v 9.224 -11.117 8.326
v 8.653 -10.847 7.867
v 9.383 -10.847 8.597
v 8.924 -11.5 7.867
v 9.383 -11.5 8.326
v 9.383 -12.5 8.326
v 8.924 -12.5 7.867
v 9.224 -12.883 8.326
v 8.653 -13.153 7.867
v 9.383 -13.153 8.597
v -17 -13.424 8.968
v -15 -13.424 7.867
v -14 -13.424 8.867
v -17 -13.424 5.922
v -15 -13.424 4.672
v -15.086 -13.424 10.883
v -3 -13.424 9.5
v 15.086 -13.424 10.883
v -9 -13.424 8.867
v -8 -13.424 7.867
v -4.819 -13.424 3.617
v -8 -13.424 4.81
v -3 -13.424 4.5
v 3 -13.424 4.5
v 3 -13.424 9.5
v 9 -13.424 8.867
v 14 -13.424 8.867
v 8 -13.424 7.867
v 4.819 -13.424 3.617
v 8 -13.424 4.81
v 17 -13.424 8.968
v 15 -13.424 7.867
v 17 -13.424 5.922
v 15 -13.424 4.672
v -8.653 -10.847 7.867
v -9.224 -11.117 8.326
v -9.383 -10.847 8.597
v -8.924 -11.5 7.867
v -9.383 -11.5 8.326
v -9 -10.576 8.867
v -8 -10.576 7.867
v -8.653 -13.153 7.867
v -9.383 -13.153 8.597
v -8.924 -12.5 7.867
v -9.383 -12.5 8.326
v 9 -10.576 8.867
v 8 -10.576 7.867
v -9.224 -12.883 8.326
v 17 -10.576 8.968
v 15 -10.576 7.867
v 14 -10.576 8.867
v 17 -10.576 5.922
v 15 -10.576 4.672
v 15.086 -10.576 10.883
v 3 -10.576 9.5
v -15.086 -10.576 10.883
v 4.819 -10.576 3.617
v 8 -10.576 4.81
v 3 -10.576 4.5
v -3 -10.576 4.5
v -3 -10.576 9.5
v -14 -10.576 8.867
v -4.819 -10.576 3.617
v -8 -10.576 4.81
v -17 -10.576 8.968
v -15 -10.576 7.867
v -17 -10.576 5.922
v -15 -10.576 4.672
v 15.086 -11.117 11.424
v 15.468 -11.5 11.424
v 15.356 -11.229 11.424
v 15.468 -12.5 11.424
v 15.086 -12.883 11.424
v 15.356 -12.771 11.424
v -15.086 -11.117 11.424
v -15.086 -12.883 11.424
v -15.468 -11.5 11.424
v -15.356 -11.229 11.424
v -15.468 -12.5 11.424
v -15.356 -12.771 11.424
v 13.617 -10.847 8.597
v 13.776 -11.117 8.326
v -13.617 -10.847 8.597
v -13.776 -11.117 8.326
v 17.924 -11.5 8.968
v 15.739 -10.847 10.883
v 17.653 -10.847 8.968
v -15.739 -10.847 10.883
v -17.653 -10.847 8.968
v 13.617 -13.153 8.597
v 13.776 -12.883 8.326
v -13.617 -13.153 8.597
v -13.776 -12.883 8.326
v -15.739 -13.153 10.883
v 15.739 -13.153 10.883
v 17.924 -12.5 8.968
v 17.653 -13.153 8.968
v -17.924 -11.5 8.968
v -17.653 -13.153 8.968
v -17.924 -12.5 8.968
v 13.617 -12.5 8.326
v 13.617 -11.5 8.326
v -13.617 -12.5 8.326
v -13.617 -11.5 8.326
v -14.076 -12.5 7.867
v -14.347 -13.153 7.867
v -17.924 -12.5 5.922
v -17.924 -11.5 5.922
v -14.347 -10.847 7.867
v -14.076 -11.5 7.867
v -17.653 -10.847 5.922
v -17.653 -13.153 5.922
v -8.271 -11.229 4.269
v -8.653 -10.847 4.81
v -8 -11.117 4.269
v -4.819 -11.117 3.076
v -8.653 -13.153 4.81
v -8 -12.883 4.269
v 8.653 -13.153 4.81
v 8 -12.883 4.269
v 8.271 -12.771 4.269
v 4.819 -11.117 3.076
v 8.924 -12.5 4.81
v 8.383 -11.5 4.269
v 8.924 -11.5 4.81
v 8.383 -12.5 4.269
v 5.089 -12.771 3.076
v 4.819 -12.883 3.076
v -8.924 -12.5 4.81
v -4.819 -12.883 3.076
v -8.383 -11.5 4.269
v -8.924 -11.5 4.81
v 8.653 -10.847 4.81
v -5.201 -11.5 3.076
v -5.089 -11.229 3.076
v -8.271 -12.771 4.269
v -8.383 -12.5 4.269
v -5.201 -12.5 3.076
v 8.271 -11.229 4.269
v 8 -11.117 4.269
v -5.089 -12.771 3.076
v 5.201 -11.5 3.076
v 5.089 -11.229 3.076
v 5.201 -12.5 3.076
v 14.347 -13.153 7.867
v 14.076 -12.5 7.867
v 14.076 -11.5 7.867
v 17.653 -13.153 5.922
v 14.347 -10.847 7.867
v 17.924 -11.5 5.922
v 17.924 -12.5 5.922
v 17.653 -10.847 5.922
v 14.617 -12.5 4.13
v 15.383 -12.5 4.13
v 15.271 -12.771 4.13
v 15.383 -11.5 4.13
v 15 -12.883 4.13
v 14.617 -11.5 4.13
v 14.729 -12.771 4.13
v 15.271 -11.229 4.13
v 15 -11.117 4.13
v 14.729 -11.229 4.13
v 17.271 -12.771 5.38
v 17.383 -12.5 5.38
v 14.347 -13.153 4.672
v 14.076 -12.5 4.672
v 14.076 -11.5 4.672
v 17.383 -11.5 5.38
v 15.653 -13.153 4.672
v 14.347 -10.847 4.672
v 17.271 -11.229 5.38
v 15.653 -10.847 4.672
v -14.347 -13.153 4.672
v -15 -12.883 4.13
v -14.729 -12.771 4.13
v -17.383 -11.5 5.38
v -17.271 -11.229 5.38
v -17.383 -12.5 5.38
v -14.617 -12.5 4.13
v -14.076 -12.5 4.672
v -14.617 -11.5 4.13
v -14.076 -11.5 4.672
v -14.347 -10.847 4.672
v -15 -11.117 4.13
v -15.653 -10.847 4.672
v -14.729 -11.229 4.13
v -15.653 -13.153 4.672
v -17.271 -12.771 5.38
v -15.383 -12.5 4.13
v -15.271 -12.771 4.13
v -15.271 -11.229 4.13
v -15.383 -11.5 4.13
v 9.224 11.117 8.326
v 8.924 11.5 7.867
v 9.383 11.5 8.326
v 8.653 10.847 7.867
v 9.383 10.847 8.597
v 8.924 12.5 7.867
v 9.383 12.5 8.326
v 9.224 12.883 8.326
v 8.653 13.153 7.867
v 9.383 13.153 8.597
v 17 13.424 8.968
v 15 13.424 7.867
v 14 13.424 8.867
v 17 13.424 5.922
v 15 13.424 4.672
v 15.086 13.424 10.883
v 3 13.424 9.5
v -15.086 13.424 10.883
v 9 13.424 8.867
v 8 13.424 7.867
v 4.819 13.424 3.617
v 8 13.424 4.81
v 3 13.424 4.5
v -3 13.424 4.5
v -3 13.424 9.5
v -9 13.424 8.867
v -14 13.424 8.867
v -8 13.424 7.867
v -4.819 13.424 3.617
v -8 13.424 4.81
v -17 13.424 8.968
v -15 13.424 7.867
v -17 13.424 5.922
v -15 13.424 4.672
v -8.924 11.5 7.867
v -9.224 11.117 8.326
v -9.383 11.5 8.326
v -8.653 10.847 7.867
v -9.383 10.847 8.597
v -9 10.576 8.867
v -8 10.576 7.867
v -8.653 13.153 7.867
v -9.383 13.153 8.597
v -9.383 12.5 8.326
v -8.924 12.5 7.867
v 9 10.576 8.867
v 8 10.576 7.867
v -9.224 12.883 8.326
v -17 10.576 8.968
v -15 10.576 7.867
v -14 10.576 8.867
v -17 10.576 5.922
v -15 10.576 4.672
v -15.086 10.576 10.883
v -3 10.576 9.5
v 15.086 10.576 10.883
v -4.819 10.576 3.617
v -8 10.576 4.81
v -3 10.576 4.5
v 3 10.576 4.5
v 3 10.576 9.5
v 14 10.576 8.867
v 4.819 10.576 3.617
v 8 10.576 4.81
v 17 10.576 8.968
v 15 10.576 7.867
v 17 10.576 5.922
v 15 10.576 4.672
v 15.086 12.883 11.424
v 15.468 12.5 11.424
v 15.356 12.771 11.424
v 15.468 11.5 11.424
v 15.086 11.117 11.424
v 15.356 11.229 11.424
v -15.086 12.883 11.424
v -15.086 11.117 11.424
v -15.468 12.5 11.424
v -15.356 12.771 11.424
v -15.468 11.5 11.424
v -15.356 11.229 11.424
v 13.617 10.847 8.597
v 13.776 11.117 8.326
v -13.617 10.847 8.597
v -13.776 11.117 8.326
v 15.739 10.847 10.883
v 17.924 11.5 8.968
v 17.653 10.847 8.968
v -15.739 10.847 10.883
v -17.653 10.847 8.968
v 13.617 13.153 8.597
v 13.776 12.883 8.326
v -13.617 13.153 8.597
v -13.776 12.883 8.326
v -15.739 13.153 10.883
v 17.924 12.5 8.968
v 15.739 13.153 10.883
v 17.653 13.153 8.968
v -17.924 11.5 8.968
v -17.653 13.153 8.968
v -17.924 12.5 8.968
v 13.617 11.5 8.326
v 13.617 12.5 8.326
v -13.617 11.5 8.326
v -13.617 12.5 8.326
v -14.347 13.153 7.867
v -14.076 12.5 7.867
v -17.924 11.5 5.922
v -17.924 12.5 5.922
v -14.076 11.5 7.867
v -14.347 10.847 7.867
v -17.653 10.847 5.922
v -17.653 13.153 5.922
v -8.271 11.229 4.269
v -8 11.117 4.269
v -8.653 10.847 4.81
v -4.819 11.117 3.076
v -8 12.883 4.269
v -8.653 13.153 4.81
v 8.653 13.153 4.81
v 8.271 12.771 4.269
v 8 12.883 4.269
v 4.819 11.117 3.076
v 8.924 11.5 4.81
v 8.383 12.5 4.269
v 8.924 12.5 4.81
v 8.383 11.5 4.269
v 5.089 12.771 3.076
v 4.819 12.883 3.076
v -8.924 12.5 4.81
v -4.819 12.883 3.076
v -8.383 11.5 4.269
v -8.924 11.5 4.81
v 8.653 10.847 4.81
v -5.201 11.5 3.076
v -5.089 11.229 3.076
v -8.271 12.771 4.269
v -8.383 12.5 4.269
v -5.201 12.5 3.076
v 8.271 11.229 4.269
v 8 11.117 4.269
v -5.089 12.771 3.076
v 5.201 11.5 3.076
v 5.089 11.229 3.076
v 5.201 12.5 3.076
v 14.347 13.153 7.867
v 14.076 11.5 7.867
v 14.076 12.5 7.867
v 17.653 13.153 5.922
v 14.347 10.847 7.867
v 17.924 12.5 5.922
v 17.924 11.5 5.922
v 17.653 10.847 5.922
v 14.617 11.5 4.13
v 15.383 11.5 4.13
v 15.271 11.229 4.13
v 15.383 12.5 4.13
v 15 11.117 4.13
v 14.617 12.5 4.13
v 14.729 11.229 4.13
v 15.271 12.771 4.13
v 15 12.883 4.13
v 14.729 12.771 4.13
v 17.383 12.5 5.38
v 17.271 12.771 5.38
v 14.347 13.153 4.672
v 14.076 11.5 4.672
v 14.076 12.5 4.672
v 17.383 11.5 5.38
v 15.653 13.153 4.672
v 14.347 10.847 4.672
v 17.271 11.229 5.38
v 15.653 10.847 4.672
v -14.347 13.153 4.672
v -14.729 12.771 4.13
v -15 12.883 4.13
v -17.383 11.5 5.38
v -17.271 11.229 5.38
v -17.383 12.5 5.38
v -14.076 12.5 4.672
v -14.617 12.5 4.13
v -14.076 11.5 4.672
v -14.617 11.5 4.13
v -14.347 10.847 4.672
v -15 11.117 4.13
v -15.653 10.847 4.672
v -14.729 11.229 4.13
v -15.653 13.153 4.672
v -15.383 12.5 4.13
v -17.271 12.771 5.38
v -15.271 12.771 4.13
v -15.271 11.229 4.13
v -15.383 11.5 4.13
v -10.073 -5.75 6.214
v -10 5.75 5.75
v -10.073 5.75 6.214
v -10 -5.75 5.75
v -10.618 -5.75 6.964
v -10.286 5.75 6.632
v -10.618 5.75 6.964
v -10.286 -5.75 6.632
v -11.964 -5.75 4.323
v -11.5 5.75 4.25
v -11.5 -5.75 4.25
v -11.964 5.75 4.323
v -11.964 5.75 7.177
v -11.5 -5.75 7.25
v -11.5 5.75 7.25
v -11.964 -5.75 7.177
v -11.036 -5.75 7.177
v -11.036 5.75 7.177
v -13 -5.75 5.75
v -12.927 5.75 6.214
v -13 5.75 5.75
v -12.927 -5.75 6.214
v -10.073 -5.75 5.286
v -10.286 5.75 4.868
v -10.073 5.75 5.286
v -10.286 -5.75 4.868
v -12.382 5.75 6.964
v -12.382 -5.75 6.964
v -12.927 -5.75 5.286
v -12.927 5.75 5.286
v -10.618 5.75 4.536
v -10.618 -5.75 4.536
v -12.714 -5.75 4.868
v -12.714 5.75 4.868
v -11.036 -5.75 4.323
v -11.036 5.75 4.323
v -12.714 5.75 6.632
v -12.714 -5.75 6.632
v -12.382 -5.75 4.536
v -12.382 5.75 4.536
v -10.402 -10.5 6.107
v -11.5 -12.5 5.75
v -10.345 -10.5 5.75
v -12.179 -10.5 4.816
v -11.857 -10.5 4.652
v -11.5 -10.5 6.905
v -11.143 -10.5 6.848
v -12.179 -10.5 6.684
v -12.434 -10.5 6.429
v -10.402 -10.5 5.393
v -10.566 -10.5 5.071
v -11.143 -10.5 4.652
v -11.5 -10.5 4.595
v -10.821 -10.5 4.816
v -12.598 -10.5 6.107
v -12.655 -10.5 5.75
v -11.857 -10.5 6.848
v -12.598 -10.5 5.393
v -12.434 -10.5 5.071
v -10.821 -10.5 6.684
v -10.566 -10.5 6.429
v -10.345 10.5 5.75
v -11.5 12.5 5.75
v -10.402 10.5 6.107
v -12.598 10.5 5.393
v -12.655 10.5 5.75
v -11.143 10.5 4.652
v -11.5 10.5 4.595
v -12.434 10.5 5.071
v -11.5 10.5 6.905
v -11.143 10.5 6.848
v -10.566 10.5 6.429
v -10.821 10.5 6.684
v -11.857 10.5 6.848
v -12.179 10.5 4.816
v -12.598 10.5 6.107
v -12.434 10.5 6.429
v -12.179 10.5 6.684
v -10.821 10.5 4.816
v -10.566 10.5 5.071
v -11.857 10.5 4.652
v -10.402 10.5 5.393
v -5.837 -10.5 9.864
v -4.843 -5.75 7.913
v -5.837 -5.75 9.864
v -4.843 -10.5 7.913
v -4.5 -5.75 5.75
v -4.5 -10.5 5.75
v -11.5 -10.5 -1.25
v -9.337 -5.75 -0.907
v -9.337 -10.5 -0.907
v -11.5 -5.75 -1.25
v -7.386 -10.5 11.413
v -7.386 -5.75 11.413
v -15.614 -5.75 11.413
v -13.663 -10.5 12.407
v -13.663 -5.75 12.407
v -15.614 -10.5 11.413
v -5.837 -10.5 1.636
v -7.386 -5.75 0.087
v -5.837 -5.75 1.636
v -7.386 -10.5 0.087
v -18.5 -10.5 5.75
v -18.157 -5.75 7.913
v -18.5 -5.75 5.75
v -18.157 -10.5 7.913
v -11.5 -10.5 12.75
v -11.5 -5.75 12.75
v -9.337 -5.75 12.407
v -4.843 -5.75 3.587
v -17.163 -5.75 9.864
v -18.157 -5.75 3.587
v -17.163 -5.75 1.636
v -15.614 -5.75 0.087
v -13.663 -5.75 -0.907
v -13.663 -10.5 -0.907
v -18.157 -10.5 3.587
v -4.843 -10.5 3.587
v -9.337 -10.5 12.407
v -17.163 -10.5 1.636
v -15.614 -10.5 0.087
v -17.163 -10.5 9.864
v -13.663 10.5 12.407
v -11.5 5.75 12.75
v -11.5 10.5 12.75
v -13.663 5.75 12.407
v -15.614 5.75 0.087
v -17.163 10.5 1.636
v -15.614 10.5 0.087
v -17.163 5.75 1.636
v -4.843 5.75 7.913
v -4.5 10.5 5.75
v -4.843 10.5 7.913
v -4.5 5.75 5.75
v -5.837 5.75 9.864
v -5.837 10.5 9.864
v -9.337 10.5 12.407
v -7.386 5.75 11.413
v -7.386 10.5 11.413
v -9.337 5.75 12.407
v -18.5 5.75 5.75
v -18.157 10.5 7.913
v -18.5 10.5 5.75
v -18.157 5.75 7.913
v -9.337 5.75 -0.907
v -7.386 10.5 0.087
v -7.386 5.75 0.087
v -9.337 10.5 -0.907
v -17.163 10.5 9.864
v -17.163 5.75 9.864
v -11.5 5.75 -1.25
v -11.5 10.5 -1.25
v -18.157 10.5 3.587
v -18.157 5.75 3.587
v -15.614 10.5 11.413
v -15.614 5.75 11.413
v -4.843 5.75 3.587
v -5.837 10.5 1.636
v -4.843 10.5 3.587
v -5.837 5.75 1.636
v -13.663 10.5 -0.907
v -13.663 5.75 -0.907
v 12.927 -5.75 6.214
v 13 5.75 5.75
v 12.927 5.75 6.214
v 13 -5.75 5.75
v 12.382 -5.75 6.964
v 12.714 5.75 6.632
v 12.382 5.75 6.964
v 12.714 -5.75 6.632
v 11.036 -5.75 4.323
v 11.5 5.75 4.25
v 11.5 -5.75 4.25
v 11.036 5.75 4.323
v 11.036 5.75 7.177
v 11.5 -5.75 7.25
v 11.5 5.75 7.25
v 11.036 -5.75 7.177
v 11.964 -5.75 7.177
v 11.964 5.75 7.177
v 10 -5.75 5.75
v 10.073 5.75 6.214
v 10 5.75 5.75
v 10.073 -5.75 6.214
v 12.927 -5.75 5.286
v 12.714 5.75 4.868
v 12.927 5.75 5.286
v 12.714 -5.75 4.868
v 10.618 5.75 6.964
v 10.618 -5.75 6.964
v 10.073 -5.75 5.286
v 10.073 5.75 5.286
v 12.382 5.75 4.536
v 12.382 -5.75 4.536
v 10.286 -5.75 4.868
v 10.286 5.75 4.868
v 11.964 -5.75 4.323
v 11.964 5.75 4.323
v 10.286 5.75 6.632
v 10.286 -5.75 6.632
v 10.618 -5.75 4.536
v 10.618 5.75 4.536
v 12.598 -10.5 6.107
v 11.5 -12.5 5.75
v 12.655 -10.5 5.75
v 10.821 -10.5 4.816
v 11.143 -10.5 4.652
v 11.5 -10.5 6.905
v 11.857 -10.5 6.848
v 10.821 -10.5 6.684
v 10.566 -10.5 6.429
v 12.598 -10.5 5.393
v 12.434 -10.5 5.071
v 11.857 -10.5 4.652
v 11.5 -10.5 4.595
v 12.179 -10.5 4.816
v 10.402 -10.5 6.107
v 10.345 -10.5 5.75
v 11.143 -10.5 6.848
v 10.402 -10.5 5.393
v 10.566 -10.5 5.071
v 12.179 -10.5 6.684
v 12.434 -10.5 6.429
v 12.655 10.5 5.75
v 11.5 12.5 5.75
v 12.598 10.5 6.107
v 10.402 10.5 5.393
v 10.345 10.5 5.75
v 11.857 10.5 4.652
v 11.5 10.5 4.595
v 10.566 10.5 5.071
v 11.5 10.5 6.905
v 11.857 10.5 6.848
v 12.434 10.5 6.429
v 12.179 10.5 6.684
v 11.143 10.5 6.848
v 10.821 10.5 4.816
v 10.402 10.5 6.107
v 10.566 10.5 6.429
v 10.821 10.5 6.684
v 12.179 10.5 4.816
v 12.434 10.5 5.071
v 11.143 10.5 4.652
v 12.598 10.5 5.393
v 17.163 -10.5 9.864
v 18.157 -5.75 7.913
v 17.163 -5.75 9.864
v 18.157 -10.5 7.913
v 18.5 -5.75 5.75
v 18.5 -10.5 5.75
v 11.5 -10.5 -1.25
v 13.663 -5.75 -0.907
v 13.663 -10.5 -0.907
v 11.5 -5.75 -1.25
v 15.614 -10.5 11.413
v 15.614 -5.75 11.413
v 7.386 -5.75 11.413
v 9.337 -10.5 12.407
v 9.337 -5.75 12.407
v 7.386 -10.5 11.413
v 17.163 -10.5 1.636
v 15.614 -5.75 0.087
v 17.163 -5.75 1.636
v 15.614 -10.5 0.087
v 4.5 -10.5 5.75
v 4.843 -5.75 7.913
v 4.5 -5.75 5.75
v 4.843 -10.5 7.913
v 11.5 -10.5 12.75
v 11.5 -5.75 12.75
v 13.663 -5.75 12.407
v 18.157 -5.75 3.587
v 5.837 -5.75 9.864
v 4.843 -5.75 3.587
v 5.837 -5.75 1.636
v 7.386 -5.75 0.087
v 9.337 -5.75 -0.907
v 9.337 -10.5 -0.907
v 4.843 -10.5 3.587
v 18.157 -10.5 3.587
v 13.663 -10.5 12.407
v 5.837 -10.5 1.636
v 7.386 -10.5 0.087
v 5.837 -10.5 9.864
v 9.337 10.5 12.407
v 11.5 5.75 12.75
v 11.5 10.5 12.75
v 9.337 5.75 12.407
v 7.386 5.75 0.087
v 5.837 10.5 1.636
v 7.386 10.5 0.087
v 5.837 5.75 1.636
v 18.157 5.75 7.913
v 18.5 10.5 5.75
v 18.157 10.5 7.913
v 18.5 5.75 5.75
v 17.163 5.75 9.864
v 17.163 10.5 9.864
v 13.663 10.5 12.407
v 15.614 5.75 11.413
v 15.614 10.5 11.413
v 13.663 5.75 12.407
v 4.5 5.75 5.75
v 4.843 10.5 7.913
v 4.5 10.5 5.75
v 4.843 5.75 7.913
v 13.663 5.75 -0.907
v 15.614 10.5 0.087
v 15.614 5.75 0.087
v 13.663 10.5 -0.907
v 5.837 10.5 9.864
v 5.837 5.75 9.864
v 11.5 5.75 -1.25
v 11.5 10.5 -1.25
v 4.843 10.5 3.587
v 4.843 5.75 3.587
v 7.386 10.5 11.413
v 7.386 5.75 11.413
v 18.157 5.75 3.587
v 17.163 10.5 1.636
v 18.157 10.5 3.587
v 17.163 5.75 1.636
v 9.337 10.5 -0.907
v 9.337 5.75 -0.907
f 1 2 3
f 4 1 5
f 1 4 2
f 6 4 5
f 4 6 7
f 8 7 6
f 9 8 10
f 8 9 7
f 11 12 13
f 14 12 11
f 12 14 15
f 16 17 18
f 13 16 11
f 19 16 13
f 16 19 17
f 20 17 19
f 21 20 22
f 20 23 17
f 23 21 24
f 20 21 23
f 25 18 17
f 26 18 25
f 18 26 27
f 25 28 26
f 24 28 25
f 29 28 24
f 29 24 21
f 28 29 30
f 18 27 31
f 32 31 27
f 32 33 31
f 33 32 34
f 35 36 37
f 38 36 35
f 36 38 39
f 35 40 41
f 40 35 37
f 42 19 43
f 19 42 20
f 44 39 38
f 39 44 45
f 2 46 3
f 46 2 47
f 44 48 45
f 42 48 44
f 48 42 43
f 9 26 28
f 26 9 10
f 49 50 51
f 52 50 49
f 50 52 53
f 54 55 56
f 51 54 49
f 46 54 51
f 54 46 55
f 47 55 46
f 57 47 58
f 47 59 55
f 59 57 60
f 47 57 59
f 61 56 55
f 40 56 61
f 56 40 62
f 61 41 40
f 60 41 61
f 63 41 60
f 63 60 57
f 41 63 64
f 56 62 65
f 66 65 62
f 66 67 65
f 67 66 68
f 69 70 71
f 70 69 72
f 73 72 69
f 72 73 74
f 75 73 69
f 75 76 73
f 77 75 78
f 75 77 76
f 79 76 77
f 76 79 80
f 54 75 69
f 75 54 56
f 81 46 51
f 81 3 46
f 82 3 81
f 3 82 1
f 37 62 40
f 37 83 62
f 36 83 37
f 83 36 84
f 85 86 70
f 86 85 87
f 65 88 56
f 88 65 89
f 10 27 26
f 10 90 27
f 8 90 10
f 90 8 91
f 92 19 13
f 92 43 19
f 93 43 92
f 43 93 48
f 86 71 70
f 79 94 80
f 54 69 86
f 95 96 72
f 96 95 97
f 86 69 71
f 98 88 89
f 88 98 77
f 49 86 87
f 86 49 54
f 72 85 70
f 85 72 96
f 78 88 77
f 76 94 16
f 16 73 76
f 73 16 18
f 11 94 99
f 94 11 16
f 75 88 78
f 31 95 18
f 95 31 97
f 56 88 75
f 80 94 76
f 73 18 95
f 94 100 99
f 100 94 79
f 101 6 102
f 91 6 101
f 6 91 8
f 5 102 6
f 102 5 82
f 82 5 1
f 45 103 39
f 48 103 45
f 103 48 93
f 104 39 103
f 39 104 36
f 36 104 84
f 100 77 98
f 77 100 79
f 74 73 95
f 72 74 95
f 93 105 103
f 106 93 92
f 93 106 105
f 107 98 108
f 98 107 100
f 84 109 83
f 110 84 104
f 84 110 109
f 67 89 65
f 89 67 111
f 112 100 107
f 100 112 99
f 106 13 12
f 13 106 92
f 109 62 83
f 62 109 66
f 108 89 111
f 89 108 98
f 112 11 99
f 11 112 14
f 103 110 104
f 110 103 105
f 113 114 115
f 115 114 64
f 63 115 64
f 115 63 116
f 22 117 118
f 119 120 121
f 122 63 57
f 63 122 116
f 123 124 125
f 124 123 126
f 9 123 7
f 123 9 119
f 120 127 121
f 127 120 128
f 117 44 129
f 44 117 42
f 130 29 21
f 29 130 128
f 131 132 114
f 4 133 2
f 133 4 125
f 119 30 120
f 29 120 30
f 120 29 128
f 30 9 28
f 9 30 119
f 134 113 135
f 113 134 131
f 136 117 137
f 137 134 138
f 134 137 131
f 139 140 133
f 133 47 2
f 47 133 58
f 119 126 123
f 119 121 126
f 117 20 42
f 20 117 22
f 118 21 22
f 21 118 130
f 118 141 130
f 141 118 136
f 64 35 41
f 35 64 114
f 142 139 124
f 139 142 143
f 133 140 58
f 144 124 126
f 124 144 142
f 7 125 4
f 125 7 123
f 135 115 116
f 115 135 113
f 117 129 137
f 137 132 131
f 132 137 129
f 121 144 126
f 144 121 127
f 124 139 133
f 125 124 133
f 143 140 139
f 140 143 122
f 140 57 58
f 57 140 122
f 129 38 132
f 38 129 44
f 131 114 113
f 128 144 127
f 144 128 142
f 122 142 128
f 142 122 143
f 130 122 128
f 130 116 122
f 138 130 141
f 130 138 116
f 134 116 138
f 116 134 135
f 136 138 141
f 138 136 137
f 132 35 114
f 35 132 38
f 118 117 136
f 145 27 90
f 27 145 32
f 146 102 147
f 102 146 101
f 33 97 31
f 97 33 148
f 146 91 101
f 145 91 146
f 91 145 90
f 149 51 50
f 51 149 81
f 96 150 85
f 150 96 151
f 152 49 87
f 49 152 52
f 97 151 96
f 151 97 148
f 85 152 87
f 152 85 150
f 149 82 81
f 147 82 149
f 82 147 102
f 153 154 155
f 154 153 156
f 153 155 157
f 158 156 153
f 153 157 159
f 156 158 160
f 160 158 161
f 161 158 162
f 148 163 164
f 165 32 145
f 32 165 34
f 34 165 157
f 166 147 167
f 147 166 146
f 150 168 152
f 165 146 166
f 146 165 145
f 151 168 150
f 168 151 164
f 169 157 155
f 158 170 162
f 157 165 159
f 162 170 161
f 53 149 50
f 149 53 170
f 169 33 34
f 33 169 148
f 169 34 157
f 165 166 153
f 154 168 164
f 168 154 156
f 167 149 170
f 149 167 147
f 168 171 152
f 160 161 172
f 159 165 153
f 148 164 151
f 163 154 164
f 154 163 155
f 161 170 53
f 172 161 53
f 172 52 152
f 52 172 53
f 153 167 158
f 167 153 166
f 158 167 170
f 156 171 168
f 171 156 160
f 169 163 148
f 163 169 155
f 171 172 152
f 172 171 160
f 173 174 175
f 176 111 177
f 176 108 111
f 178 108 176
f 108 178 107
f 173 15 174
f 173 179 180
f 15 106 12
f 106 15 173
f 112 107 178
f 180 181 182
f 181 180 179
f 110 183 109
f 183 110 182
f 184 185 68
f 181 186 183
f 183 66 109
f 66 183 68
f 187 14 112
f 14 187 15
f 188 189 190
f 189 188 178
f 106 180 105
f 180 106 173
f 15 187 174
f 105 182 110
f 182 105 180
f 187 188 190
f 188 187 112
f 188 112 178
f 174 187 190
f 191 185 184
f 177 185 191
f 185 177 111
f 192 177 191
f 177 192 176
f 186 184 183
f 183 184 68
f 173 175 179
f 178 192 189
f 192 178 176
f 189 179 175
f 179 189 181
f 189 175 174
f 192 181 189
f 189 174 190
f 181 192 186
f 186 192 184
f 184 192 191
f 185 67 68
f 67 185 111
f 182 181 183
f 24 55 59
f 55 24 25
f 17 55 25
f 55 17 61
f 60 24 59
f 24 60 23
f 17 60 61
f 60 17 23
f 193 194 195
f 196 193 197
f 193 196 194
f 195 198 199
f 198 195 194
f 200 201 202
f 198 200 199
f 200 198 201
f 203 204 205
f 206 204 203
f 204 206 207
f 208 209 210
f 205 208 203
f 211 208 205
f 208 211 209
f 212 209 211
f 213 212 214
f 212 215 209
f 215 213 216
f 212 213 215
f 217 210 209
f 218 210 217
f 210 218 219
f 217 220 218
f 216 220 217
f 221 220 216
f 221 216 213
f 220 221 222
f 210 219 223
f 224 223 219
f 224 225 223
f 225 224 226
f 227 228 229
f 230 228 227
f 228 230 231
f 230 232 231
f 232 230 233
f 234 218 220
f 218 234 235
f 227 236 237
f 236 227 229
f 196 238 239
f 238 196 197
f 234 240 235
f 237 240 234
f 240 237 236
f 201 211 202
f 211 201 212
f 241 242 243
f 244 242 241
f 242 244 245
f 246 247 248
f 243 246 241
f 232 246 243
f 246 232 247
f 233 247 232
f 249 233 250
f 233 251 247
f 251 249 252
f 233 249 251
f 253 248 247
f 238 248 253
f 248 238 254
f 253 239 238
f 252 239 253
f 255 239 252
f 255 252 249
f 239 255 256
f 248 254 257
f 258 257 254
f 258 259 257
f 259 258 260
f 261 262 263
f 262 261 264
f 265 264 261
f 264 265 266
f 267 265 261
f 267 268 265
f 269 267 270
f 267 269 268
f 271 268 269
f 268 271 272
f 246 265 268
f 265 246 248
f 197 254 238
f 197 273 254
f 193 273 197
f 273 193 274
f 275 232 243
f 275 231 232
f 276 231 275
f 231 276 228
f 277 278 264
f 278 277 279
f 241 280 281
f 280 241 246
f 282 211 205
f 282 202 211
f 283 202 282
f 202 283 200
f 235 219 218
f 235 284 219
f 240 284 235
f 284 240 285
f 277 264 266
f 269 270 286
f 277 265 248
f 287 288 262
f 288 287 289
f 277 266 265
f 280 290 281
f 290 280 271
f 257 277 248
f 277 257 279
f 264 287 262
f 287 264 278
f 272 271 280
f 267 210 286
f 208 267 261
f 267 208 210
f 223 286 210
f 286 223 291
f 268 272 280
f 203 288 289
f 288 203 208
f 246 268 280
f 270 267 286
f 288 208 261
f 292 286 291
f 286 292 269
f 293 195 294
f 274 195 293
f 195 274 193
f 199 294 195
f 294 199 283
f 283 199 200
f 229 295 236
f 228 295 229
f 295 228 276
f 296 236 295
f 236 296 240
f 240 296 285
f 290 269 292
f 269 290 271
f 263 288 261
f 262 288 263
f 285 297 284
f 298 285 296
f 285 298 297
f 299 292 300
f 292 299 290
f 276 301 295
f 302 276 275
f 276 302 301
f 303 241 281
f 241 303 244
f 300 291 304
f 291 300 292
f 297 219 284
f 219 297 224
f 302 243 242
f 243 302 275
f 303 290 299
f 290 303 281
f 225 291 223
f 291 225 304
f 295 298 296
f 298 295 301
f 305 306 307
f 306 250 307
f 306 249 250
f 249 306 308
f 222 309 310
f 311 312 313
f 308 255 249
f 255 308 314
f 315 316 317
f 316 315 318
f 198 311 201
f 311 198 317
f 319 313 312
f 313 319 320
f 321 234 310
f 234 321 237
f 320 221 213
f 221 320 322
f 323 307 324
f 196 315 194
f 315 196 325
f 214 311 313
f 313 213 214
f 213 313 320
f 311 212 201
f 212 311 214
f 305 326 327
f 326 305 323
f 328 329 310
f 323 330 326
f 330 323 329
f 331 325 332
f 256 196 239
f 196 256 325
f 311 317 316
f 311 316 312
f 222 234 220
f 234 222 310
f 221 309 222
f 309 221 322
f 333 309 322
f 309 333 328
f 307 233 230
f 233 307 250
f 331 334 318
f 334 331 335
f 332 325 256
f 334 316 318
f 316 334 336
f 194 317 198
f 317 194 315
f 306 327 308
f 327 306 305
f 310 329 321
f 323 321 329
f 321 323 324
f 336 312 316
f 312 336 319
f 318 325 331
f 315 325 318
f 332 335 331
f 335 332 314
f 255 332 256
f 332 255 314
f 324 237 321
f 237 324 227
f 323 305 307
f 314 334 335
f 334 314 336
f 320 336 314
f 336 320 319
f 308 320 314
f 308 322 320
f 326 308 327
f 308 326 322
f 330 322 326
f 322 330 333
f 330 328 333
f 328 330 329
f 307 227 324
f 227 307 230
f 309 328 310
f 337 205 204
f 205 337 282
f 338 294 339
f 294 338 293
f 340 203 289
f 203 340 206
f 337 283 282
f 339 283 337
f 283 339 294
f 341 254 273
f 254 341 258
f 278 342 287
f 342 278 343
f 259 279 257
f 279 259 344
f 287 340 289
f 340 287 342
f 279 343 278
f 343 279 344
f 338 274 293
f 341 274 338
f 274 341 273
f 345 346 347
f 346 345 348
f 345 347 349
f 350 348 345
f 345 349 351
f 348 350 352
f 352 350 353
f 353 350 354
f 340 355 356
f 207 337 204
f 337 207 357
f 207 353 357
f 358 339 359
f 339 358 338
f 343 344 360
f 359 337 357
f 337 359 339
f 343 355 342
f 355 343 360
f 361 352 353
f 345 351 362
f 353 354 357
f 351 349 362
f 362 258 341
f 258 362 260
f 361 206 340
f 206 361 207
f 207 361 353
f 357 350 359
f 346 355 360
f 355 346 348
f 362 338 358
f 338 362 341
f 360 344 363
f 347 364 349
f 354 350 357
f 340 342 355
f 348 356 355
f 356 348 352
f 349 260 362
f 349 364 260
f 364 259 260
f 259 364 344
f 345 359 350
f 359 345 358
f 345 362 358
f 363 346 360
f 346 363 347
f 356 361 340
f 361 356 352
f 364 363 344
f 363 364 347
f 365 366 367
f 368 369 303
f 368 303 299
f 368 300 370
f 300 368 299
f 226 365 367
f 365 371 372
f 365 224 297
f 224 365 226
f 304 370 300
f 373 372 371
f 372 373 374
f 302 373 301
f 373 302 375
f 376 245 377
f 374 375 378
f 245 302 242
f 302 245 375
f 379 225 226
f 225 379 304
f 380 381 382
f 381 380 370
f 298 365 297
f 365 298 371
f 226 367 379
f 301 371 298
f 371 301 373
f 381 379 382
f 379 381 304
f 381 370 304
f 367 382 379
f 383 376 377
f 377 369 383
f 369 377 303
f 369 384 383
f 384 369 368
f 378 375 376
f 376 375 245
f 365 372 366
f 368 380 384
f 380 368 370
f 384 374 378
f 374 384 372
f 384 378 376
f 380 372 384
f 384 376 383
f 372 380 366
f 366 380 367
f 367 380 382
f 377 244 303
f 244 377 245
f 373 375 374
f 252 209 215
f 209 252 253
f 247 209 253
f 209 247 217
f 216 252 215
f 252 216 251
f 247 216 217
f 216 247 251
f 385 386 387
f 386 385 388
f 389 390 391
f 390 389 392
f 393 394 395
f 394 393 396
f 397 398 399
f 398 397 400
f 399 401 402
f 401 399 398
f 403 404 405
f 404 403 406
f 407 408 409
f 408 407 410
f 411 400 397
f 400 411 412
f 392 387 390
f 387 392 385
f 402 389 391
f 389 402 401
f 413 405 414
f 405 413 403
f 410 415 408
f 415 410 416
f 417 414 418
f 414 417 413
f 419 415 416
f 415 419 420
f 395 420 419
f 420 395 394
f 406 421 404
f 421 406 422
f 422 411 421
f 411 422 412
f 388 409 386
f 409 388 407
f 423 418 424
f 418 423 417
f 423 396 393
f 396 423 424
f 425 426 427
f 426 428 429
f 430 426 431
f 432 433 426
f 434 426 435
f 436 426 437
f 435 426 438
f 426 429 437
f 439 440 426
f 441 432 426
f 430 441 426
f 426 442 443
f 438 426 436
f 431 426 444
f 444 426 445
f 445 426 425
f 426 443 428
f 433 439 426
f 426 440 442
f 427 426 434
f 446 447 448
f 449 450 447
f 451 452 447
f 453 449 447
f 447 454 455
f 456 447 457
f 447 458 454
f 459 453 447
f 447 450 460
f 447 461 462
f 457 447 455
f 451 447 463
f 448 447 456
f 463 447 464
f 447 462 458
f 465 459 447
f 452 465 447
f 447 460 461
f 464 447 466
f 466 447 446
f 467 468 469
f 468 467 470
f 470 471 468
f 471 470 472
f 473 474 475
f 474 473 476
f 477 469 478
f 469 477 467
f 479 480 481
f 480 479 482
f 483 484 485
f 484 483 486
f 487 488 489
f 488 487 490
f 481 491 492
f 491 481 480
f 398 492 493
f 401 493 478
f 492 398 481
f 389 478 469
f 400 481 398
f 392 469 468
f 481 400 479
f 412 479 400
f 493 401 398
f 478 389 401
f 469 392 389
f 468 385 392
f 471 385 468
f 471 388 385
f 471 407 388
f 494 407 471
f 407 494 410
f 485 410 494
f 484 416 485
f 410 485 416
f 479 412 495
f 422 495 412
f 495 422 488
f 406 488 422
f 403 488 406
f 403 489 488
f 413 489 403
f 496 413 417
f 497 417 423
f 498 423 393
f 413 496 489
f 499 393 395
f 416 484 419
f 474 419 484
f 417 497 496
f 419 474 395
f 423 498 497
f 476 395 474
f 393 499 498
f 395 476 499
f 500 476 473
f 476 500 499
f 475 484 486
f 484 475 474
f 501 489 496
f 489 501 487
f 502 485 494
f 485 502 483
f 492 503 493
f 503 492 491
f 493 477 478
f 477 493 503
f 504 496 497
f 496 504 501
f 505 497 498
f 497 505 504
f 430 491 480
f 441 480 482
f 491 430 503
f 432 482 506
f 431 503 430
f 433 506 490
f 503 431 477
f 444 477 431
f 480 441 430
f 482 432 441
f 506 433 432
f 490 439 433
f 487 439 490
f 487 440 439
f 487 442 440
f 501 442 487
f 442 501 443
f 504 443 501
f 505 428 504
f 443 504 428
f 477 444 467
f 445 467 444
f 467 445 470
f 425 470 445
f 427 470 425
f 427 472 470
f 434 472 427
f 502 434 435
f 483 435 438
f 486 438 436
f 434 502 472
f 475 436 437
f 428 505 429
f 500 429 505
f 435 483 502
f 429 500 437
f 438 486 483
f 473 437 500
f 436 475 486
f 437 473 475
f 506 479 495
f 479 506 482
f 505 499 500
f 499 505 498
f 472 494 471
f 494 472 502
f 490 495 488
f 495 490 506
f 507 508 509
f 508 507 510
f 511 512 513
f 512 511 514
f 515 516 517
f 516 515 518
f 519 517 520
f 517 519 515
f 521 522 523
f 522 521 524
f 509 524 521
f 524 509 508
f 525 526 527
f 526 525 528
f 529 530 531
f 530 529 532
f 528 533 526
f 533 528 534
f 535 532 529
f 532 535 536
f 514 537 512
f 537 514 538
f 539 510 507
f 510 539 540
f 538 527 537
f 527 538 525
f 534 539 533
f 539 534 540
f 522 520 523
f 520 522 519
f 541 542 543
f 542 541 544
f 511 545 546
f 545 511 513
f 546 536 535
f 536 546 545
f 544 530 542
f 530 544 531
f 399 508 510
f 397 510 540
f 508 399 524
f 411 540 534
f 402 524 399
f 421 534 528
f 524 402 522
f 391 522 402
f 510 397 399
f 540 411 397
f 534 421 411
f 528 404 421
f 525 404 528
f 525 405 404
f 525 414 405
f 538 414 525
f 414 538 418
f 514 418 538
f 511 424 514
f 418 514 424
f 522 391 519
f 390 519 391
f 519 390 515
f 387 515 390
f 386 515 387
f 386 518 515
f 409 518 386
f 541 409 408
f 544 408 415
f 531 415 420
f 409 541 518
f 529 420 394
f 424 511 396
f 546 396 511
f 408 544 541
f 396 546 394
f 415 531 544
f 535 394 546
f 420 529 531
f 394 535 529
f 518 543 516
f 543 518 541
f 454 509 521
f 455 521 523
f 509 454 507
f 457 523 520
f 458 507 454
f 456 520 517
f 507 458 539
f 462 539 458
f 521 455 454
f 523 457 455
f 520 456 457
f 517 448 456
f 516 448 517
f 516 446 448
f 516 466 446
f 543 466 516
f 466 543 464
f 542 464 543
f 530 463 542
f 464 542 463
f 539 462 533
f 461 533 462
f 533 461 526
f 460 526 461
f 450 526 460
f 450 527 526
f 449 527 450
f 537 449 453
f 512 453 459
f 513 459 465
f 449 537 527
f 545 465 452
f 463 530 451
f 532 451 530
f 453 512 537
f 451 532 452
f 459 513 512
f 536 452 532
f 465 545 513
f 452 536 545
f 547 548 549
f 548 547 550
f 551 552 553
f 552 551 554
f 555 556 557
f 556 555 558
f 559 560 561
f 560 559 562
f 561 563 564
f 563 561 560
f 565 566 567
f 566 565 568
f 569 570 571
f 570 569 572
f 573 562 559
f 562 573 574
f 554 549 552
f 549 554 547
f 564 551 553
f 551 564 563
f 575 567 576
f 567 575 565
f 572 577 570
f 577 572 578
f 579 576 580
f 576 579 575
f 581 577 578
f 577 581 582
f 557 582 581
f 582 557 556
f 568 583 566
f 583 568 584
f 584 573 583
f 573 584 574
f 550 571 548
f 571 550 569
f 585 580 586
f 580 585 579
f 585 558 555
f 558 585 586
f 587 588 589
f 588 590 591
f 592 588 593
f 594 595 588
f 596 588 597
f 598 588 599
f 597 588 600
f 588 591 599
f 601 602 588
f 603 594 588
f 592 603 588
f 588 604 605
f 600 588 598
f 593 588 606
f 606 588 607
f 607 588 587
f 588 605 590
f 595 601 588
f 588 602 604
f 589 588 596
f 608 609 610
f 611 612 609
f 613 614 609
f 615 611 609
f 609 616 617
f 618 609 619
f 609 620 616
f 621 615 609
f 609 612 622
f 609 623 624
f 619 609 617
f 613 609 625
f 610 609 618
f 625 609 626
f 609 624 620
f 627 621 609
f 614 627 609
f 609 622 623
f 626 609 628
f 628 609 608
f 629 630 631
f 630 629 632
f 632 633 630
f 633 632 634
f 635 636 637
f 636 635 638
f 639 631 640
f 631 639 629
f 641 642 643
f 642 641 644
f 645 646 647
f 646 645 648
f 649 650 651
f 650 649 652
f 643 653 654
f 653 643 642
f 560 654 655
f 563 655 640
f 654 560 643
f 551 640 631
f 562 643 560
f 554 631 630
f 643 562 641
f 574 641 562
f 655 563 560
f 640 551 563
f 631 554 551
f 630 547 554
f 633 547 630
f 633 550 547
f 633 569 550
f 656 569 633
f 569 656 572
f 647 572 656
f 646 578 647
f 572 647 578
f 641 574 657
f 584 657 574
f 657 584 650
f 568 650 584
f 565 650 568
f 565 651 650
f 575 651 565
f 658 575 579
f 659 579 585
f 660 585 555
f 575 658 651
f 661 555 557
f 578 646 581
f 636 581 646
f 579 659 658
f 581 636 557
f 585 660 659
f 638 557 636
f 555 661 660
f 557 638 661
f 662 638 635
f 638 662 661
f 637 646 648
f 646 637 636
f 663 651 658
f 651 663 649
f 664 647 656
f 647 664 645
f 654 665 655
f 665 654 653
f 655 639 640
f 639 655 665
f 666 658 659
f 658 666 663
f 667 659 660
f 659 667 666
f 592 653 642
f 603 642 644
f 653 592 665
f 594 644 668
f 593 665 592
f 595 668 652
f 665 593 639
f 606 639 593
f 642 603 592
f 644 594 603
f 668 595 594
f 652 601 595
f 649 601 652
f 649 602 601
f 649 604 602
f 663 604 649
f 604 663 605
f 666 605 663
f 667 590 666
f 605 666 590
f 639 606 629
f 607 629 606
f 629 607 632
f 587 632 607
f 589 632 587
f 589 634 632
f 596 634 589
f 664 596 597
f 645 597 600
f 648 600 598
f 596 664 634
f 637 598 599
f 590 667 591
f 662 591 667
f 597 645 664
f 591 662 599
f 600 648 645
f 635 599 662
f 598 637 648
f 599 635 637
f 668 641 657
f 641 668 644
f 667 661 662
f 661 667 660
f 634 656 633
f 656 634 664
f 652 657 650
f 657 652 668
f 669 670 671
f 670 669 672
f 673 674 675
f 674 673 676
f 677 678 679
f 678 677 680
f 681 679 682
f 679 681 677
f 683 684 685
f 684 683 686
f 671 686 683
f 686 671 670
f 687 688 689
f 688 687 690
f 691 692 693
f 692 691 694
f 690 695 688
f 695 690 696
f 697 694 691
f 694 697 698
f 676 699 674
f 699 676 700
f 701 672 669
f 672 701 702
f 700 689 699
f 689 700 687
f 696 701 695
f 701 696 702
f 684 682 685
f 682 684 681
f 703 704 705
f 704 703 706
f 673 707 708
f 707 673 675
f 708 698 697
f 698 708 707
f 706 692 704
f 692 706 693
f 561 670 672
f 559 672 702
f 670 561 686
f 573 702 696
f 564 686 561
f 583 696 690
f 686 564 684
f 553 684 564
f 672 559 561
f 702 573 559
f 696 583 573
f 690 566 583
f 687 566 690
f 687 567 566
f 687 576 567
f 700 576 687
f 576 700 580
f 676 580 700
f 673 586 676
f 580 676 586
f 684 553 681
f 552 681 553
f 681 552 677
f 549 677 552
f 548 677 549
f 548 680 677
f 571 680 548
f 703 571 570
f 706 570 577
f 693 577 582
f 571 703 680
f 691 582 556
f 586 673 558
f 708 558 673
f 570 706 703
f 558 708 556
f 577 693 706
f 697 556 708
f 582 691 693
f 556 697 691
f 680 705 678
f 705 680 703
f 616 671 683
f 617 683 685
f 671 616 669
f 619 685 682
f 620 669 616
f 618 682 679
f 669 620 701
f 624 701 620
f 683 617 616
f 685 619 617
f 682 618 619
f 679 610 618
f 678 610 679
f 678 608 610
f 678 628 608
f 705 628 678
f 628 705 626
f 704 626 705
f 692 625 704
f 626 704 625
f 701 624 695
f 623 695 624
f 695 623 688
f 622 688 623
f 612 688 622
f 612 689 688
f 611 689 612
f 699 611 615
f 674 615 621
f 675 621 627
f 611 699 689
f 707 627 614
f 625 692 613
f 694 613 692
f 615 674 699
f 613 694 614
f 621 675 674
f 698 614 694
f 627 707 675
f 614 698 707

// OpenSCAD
AXLE_DISTANCE = 23;
BOGIE_SADDLE_HEIGHT = 7.9;

WHEEL_D = 11.5;

AXLE_HEIGHT = WHEEL_D / 2;
AXLE_INNER_SPACING = 11.5; // between that area only axle itself 

// spacing for axle/wheels to fit
SP_AXLE_LEN = 25;
SP_WHEEL_OUTER_DISTANCE = 21;
SP_WHEEL_DIAMETER = 14; //
SP_WHEEL_WIDTH = (SP_WHEEL_OUTER_DISTANCE-AXLE_INNER_SPACING)/2;
SP_AXLE_D = 3;
SP_AXLE_END_ANGLE_2 = 30; // _2 means half of the angle

SP_AXLE_END_LEN = (SP_AXLE_D / 2) / tan(SP_AXLE_END_ANGLE_2);

//

XXX_THICKNESS = 3;
XXX_ROUNDNESS = 1;

_bogie();
#_totalAxleSpacing();

module _bogie() {
    translate([0,-SP_WHEEL_OUTER_DISTANCE/2])
        _sideRight();
    translate([0,SP_WHEEL_OUTER_DISTANCE/2])
        mirror([0,1,0])
            _sideRight();
}

module _sideRight() {
    difference() {
        minkowski(){ sphere(XXX_ROUNDNESS, $fn=8);
        rotate(90, [1,0,0])
            translate([0,0,XXX_ROUNDNESS])
                linear_extrude(XXX_THICKNESS-2*XXX_ROUNDNESS)
                    offset(-XXX_ROUNDNESS)
                        _xxxProfile();
        }
        //
        translate([0,0,7])
        cube([6, 100, 5],true);
    }
}

module _xxxProfile() {
    _xxxProfileHalf();
    mirror([1,0,0])
        _xxxProfileHalf();
}

module _xxxProfileHalf() {
    _y_up = 11.5;
    _y_down = 3;
    _x_max = AXLE_DISTANCE/2+6.5;
    _up_corner = 2.5;
    _wheelx_2 = 2.5;
    polygon([
        // *** uper row center
        [-0.01,_y_up],
        // move to right
        [_x_max-_up_corner,_y_up],
        [_x_max,_y_up-_up_corner],
        [_x_max,AXLE_HEIGHT],
        // around the axle holder
        [AXLE_DISTANCE/2+_wheelx_2, AXLE_HEIGHT-_wheelx_2],
        [AXLE_DISTANCE/2+_wheelx_2, AXLE_HEIGHT+_wheelx_2],
        [AXLE_DISTANCE/2-_wheelx_2, AXLE_HEIGHT+_wheelx_2],
        [AXLE_DISTANCE/2-_wheelx_2, AXLE_HEIGHT-_wheelx_2/2],
        [AXLE_DISTANCE/2-_wheelx_2-4, _y_down],
        [-0.01,_y_down],
    ]);
}

module _totalAxleSpacing() {
    translate([-AXLE_DISTANCE/2, 0, AXLE_HEIGHT])
        _axleSpacing();
    translate([AXLE_DISTANCE/2, 0, AXLE_HEIGHT])
        _axleSpacing();
}

// spacing for one axle, axle centre along Y axis
module _axleSpacing() {
    // 
    rotate(90, [1,0,0])
        cylinder(SP_AXLE_LEN-2*SP_AXLE_END_LEN+0.1,
            SP_AXLE_D/2, SP_AXLE_D/2, true, $fn=20);
    // right end
    translate([0,-SP_AXLE_LEN/2+SP_AXLE_END_LEN])
        _axleEndSpaceRight();
    // left end
    translate([0,SP_AXLE_LEN/2-SP_AXLE_END_LEN])
        mirror([0,1,0])
            _axleEndSpaceRight();
    // right end
    translate([0,-AXLE_INNER_SPACING/2])
        _wheelSpaceRight();
    // left end
    translate([0,AXLE_INNER_SPACING/2])
        mirror([0,1,0])
            _wheelSpaceRight();
}

module _axleEndSpaceRight() { // torwards -Y
    rotate(90, [1,0,0])
        cylinder(SP_AXLE_END_LEN, SP_AXLE_D/2, 0, $fn=20);
    // TODO
}

module _wheelSpaceRight() { // torwards -Y
    rotate(90, [1,0,0])
        cylinder(SP_WHEEL_WIDTH, SP_WHEEL_DIAMETER/2, SP_WHEEL_DIAMETER/2, $fn=20);
}
